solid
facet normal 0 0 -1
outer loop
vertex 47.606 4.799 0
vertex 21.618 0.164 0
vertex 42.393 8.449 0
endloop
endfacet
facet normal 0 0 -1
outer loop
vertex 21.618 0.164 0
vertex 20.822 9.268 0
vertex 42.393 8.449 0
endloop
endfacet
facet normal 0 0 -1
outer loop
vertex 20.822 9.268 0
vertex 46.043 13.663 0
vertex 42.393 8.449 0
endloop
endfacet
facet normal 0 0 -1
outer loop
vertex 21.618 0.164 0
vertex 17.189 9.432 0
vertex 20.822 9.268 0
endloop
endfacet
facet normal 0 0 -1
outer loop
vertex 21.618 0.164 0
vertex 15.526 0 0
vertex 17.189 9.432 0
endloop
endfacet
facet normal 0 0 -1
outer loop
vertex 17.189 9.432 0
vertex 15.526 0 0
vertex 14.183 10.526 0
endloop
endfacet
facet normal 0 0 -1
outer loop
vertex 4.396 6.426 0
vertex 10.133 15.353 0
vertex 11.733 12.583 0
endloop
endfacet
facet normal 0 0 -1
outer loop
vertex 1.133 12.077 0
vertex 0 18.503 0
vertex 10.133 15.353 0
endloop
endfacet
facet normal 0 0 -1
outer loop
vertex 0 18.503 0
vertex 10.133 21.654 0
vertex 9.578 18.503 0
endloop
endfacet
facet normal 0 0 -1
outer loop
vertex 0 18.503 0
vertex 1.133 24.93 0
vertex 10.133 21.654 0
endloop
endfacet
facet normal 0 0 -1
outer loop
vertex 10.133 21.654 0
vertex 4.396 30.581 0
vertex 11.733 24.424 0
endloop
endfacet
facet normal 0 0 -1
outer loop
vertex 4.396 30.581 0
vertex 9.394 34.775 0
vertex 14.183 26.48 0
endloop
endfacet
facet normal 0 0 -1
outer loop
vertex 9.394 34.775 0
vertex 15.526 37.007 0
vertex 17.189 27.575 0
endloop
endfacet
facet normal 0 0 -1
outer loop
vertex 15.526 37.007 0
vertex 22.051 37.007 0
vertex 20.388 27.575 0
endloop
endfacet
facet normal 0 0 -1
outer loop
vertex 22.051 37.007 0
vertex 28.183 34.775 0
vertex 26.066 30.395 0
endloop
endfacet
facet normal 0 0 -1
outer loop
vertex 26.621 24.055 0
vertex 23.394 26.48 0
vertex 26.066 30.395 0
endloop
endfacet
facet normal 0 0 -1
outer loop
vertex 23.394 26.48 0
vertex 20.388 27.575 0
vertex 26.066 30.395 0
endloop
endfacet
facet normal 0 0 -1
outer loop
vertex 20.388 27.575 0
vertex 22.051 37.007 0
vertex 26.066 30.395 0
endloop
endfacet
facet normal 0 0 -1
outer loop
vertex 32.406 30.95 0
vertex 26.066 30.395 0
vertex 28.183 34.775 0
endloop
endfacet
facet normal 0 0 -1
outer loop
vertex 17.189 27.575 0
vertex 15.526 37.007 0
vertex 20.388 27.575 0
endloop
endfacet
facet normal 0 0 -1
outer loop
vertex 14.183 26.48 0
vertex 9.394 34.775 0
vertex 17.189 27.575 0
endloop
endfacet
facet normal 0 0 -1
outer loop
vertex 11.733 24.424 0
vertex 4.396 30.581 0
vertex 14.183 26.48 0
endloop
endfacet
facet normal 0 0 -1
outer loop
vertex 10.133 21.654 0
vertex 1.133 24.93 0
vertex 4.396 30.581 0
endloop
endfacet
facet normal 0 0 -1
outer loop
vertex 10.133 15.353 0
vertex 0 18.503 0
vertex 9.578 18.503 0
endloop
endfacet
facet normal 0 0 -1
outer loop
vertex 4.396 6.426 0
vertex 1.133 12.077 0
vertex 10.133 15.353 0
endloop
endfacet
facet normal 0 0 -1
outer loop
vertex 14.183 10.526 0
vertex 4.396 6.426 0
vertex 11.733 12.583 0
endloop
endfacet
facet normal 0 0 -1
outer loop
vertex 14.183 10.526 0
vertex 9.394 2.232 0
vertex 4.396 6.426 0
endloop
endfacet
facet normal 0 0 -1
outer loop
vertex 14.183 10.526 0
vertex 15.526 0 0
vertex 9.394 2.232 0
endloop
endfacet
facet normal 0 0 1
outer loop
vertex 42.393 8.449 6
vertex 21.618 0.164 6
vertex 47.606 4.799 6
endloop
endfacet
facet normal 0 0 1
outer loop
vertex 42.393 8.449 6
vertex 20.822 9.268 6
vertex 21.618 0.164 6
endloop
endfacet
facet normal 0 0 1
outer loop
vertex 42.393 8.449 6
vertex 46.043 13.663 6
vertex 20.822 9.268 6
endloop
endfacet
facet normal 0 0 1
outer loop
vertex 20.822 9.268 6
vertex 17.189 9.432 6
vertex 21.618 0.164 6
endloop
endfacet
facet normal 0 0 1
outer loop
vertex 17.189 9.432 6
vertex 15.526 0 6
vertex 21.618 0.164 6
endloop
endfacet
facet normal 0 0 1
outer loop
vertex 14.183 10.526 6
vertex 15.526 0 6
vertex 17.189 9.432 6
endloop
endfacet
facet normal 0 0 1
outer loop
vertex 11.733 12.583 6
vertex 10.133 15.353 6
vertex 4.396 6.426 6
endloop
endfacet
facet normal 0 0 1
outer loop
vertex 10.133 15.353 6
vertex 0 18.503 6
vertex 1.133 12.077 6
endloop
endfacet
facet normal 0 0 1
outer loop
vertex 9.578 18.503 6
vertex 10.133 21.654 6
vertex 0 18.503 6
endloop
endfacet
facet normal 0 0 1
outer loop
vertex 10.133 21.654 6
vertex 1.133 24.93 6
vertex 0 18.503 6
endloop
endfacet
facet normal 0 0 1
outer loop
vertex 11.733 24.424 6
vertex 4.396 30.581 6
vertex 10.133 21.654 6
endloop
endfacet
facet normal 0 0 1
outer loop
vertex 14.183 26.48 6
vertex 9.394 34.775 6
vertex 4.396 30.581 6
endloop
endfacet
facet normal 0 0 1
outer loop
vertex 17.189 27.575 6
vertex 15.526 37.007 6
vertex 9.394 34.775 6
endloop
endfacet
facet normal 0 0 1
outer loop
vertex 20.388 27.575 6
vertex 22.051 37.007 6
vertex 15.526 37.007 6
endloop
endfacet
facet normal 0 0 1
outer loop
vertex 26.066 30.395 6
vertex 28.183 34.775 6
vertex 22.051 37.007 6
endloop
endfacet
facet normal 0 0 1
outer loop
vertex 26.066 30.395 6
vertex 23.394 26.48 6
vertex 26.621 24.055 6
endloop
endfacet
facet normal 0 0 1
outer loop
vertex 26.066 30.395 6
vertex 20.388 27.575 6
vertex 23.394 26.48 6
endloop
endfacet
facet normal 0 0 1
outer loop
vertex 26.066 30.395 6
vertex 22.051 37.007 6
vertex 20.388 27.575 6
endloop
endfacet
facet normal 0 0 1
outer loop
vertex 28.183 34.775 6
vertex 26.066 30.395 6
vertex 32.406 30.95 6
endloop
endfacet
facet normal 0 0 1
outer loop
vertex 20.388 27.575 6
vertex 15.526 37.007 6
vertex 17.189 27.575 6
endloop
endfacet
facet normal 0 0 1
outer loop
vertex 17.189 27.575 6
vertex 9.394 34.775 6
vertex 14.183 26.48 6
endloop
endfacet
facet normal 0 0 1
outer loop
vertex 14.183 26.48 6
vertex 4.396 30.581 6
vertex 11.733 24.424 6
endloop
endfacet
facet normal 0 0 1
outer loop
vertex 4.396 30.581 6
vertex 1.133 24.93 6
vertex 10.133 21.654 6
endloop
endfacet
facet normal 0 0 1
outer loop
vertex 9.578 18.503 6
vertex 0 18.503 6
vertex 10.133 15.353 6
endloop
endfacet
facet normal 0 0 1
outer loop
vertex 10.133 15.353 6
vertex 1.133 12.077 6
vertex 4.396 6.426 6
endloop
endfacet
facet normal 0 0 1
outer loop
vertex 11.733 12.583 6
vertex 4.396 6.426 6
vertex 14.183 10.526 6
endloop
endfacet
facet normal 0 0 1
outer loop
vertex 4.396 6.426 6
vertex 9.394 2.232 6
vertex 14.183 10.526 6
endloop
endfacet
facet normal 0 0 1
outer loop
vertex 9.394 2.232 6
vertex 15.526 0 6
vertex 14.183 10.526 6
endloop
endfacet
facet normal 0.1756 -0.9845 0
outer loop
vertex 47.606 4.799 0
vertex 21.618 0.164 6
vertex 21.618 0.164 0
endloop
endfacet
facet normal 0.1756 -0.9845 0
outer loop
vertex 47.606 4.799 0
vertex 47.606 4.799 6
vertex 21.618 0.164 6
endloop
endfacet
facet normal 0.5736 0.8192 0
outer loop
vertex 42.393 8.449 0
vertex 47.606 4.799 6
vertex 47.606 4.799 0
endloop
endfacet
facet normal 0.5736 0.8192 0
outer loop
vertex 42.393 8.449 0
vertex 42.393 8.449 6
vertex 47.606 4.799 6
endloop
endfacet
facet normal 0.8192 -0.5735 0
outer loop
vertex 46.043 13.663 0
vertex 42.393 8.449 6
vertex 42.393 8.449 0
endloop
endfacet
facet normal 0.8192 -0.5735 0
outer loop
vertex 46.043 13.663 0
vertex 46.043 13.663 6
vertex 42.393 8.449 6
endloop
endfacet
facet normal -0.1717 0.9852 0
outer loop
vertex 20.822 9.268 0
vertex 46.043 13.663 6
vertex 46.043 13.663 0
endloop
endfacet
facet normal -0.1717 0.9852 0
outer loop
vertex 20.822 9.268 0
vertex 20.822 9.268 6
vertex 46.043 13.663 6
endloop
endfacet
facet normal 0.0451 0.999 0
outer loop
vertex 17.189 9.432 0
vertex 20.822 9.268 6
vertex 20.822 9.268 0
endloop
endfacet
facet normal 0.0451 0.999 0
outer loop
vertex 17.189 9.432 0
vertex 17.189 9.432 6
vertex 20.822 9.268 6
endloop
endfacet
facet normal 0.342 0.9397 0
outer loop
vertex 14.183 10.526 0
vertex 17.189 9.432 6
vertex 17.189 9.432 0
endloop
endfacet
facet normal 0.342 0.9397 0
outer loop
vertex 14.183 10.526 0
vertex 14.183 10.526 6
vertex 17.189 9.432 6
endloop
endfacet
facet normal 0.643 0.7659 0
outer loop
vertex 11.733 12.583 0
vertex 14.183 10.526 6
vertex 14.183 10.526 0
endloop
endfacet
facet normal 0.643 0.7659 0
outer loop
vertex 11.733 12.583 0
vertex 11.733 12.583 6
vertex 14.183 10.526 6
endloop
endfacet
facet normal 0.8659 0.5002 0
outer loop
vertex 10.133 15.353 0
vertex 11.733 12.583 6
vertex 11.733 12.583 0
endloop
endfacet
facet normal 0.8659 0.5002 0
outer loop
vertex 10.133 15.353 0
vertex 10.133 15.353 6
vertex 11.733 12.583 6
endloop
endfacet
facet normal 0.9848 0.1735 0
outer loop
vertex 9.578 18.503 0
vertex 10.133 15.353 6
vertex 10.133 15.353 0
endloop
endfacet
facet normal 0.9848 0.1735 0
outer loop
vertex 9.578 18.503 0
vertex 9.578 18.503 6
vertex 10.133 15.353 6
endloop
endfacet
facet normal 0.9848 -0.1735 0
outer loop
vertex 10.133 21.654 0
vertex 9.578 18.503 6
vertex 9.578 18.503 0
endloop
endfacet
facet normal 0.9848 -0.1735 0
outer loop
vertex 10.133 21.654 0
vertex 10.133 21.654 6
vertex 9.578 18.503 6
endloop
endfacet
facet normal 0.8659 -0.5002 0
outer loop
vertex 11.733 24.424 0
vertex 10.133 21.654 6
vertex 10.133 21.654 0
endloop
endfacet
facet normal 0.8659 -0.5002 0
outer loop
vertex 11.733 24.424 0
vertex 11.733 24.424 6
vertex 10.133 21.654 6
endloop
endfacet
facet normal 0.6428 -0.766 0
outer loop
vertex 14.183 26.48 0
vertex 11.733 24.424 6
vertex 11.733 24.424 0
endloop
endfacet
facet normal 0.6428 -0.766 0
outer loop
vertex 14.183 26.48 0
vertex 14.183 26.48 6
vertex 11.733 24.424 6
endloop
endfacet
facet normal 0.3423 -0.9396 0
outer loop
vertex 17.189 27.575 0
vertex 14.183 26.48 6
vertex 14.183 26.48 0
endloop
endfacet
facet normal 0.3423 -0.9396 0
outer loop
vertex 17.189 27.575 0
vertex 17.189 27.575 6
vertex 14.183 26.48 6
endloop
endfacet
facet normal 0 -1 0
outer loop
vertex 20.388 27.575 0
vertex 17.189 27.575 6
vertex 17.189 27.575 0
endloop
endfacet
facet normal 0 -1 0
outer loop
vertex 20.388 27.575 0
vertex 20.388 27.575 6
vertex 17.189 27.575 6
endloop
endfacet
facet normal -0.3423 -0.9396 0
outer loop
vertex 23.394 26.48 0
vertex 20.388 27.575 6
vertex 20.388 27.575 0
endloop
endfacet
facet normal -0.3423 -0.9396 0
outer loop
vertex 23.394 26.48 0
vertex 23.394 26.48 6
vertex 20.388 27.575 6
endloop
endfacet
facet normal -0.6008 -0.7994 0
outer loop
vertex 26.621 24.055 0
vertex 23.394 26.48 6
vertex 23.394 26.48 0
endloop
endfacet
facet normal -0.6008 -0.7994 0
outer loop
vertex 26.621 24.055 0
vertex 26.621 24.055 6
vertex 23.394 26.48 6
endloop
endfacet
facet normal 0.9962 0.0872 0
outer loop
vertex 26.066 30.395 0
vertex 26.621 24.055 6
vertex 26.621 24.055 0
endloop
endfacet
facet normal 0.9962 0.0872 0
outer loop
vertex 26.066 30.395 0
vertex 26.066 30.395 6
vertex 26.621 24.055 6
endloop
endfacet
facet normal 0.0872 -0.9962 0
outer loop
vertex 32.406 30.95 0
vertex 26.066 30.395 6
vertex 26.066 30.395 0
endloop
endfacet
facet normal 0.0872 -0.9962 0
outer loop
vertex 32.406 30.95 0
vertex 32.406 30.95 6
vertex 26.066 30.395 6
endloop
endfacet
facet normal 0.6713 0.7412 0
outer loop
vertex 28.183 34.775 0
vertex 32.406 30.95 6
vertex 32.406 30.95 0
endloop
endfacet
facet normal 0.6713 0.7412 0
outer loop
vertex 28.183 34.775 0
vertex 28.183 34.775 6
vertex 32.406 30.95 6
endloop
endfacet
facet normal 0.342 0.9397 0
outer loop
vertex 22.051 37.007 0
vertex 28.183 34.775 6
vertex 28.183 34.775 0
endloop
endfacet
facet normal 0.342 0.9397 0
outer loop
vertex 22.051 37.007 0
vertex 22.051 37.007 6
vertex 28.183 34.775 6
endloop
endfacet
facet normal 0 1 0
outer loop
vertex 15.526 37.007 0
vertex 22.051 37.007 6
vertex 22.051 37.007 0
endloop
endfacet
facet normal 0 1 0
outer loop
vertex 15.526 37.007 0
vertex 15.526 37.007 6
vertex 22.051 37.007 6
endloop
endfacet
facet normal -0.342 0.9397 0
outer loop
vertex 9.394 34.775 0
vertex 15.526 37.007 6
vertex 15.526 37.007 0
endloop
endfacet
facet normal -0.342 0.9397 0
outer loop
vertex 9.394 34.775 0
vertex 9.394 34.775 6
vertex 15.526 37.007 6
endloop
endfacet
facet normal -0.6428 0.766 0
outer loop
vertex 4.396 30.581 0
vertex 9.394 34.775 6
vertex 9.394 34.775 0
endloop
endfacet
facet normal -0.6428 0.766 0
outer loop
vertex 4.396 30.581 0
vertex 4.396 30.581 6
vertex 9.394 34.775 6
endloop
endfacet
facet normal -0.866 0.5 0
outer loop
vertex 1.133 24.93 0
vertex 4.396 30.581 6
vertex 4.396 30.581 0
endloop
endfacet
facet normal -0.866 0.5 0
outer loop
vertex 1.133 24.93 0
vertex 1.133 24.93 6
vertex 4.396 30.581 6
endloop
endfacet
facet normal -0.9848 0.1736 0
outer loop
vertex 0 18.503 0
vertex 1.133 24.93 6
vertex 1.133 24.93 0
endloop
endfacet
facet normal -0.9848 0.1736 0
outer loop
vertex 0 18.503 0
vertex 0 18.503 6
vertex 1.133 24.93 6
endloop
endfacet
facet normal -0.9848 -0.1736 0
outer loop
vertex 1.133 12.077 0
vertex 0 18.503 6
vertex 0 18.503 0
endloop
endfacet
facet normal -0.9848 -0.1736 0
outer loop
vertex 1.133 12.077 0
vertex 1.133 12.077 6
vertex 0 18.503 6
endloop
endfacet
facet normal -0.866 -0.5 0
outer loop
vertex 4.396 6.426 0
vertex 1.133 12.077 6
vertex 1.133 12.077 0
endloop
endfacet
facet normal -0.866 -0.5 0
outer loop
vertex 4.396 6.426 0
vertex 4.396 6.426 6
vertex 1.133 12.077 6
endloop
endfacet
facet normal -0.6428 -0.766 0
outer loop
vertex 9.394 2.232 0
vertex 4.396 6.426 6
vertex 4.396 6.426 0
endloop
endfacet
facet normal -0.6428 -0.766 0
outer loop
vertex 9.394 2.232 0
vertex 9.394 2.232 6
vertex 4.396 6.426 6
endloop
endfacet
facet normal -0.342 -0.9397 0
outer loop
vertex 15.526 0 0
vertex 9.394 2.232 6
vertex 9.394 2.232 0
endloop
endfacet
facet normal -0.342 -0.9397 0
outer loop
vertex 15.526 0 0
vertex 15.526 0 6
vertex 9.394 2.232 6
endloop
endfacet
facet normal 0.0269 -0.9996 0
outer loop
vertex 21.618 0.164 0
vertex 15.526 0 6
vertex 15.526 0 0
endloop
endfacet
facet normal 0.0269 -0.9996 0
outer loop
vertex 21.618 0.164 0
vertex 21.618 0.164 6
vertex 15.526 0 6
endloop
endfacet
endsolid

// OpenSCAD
$fn = 32;

// ----------------------------------------------------------------------
// Eye lug: ring_tail, 6 mm thick
// ----------------------------------------------------------------------

// --- parameters (mm) ---
profile_height = 6;       // extrusion height
profile_points = 30;      // points of the closed outline

profile = [[26.066, 30.395], [32.406, 30.95], [28.183, 34.775], [22.051, 37.007], [15.526, 37.007], [9.394, 34.775], [4.396, 30.581], [1.133, 24.93], [0, 18.503], [1.133, 12.077], [4.396, 6.426], [9.394, 2.232], [15.526, 0], [21.618, 0.164], [47.606, 4.799], [42.393, 8.449], [46.043, 13.663], [20.822, 9.268], [17.189, 9.432], [14.183, 10.526], [11.733, 12.583], [10.133, 15.353], [9.578, 18.503], [10.133, 21.654], [11.733, 24.424], [14.183, 26.48], [17.189, 27.575], [20.388, 27.575], [23.394, 26.48], [26.621, 24.055]];  // single closed polygon, 30 points, counter clockwise

// --- the one profile operation ---
linear_extrude(height = profile_height) polygon(points = profile);
